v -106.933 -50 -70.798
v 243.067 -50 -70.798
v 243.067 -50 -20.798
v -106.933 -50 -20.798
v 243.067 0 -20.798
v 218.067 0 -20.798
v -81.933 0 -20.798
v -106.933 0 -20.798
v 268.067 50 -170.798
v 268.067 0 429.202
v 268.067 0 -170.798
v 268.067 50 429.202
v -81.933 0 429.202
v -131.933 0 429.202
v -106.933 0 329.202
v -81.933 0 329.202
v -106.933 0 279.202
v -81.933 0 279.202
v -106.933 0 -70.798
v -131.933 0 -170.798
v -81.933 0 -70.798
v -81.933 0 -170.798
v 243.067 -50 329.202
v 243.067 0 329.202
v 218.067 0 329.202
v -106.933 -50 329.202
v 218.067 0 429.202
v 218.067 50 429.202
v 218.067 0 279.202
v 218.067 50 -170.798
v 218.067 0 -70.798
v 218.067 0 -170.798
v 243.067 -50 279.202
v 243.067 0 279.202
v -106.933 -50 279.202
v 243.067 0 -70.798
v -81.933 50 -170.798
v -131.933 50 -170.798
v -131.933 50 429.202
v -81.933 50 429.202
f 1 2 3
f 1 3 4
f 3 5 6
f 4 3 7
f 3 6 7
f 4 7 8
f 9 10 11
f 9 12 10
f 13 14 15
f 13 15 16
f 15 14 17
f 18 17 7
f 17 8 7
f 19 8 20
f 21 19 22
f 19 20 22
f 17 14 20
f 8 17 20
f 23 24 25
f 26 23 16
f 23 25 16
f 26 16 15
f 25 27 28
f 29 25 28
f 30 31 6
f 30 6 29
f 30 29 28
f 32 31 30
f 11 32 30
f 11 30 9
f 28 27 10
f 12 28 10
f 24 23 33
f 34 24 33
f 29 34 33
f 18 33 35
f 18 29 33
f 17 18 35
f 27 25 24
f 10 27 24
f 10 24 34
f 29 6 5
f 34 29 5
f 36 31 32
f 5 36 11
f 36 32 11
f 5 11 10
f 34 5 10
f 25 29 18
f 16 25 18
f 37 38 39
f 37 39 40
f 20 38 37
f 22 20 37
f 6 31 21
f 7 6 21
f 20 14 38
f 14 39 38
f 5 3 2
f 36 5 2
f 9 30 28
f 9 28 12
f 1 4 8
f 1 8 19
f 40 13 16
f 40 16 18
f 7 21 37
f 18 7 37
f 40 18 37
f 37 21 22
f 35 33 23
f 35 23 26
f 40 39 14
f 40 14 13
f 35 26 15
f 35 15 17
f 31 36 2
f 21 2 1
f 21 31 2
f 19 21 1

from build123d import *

# Parameters (mm, degrees)
SKETCH1_W             = 50
SKETCH1_H             = 600
BOSS_EXTRUDE1_DEPTH   = 50
BOSS_EXTRUDE1_2_DEPTH = 50
SKETCH2_W             = 400
SKETCH2_H             = 50
BOSS_EXTRUDE2_DEPTH   = 50
SKETCH4_W             = 25
SKETCH4_H             = 400
CUT_EXTRUDE2_DEPTH    = 50


with BuildPart() as part:
    # Sketch1 → Boss-Extrude1 (new body)
    with BuildSketch(Plane(origin=(0, 0, 0), x_dir=(1, 0, 0), z_dir=(0, 1, 0))):
        with Locations((-106.932773109, -129.201680672)):
            Rectangle(SKETCH1_W, SKETCH1_H)
    extrude(amount=BOSS_EXTRUDE1_DEPTH)



with BuildPart() as body_2:
    # Sketch1 → Boss-Extrude1 2 (new body)
    with BuildSketch(Plane(origin=(0, 0, 0), x_dir=(1, 0, 0), z_dir=(0, 1, 0))):
        with Locations((243.067226891, -129.201680672)):
            Rectangle(SKETCH1_W, SKETCH1_H)
    extrude(amount=BOSS_EXTRUDE1_2_DEPTH)


with BuildPart() as part_1:
    add(part.part)

    add(body_2.part)  # Boss-Extrude2 merges body 2
    # Sketch2 → Boss-Extrude2 (add)
    with BuildSketch(Plane(origin=(0, 0, 0), x_dir=(-1, 0, 0), z_dir=(0, -1, 0))):
        with Locations((-68.067226891, -304.201680672)):
            Rectangle(SKETCH2_W, SKETCH2_H)
        with Locations((-68.067226891, 45.798319328)):
            Rectangle(SKETCH2_W, SKETCH2_H)
    extrude(amount=BOSS_EXTRUDE2_DEPTH)

    # Sketch4 → Cut-Extrude2 (cut)
    with BuildSketch(Plane(origin=(0, -50, 0), x_dir=(-1, 0, 0), z_dir=(0, -1, 0))):
        with Locations((-255.567226891, -129.201680672)):
            Rectangle(SKETCH4_W, SKETCH4_H)
        with Locations((119.432773109, -129.201680672)):
            Rectangle(SKETCH4_W, SKETCH4_H)
    extrude(amount=-CUT_EXTRUDE2_DEPTH, mode=Mode.SUBTRACT)


solid = part_1.part
